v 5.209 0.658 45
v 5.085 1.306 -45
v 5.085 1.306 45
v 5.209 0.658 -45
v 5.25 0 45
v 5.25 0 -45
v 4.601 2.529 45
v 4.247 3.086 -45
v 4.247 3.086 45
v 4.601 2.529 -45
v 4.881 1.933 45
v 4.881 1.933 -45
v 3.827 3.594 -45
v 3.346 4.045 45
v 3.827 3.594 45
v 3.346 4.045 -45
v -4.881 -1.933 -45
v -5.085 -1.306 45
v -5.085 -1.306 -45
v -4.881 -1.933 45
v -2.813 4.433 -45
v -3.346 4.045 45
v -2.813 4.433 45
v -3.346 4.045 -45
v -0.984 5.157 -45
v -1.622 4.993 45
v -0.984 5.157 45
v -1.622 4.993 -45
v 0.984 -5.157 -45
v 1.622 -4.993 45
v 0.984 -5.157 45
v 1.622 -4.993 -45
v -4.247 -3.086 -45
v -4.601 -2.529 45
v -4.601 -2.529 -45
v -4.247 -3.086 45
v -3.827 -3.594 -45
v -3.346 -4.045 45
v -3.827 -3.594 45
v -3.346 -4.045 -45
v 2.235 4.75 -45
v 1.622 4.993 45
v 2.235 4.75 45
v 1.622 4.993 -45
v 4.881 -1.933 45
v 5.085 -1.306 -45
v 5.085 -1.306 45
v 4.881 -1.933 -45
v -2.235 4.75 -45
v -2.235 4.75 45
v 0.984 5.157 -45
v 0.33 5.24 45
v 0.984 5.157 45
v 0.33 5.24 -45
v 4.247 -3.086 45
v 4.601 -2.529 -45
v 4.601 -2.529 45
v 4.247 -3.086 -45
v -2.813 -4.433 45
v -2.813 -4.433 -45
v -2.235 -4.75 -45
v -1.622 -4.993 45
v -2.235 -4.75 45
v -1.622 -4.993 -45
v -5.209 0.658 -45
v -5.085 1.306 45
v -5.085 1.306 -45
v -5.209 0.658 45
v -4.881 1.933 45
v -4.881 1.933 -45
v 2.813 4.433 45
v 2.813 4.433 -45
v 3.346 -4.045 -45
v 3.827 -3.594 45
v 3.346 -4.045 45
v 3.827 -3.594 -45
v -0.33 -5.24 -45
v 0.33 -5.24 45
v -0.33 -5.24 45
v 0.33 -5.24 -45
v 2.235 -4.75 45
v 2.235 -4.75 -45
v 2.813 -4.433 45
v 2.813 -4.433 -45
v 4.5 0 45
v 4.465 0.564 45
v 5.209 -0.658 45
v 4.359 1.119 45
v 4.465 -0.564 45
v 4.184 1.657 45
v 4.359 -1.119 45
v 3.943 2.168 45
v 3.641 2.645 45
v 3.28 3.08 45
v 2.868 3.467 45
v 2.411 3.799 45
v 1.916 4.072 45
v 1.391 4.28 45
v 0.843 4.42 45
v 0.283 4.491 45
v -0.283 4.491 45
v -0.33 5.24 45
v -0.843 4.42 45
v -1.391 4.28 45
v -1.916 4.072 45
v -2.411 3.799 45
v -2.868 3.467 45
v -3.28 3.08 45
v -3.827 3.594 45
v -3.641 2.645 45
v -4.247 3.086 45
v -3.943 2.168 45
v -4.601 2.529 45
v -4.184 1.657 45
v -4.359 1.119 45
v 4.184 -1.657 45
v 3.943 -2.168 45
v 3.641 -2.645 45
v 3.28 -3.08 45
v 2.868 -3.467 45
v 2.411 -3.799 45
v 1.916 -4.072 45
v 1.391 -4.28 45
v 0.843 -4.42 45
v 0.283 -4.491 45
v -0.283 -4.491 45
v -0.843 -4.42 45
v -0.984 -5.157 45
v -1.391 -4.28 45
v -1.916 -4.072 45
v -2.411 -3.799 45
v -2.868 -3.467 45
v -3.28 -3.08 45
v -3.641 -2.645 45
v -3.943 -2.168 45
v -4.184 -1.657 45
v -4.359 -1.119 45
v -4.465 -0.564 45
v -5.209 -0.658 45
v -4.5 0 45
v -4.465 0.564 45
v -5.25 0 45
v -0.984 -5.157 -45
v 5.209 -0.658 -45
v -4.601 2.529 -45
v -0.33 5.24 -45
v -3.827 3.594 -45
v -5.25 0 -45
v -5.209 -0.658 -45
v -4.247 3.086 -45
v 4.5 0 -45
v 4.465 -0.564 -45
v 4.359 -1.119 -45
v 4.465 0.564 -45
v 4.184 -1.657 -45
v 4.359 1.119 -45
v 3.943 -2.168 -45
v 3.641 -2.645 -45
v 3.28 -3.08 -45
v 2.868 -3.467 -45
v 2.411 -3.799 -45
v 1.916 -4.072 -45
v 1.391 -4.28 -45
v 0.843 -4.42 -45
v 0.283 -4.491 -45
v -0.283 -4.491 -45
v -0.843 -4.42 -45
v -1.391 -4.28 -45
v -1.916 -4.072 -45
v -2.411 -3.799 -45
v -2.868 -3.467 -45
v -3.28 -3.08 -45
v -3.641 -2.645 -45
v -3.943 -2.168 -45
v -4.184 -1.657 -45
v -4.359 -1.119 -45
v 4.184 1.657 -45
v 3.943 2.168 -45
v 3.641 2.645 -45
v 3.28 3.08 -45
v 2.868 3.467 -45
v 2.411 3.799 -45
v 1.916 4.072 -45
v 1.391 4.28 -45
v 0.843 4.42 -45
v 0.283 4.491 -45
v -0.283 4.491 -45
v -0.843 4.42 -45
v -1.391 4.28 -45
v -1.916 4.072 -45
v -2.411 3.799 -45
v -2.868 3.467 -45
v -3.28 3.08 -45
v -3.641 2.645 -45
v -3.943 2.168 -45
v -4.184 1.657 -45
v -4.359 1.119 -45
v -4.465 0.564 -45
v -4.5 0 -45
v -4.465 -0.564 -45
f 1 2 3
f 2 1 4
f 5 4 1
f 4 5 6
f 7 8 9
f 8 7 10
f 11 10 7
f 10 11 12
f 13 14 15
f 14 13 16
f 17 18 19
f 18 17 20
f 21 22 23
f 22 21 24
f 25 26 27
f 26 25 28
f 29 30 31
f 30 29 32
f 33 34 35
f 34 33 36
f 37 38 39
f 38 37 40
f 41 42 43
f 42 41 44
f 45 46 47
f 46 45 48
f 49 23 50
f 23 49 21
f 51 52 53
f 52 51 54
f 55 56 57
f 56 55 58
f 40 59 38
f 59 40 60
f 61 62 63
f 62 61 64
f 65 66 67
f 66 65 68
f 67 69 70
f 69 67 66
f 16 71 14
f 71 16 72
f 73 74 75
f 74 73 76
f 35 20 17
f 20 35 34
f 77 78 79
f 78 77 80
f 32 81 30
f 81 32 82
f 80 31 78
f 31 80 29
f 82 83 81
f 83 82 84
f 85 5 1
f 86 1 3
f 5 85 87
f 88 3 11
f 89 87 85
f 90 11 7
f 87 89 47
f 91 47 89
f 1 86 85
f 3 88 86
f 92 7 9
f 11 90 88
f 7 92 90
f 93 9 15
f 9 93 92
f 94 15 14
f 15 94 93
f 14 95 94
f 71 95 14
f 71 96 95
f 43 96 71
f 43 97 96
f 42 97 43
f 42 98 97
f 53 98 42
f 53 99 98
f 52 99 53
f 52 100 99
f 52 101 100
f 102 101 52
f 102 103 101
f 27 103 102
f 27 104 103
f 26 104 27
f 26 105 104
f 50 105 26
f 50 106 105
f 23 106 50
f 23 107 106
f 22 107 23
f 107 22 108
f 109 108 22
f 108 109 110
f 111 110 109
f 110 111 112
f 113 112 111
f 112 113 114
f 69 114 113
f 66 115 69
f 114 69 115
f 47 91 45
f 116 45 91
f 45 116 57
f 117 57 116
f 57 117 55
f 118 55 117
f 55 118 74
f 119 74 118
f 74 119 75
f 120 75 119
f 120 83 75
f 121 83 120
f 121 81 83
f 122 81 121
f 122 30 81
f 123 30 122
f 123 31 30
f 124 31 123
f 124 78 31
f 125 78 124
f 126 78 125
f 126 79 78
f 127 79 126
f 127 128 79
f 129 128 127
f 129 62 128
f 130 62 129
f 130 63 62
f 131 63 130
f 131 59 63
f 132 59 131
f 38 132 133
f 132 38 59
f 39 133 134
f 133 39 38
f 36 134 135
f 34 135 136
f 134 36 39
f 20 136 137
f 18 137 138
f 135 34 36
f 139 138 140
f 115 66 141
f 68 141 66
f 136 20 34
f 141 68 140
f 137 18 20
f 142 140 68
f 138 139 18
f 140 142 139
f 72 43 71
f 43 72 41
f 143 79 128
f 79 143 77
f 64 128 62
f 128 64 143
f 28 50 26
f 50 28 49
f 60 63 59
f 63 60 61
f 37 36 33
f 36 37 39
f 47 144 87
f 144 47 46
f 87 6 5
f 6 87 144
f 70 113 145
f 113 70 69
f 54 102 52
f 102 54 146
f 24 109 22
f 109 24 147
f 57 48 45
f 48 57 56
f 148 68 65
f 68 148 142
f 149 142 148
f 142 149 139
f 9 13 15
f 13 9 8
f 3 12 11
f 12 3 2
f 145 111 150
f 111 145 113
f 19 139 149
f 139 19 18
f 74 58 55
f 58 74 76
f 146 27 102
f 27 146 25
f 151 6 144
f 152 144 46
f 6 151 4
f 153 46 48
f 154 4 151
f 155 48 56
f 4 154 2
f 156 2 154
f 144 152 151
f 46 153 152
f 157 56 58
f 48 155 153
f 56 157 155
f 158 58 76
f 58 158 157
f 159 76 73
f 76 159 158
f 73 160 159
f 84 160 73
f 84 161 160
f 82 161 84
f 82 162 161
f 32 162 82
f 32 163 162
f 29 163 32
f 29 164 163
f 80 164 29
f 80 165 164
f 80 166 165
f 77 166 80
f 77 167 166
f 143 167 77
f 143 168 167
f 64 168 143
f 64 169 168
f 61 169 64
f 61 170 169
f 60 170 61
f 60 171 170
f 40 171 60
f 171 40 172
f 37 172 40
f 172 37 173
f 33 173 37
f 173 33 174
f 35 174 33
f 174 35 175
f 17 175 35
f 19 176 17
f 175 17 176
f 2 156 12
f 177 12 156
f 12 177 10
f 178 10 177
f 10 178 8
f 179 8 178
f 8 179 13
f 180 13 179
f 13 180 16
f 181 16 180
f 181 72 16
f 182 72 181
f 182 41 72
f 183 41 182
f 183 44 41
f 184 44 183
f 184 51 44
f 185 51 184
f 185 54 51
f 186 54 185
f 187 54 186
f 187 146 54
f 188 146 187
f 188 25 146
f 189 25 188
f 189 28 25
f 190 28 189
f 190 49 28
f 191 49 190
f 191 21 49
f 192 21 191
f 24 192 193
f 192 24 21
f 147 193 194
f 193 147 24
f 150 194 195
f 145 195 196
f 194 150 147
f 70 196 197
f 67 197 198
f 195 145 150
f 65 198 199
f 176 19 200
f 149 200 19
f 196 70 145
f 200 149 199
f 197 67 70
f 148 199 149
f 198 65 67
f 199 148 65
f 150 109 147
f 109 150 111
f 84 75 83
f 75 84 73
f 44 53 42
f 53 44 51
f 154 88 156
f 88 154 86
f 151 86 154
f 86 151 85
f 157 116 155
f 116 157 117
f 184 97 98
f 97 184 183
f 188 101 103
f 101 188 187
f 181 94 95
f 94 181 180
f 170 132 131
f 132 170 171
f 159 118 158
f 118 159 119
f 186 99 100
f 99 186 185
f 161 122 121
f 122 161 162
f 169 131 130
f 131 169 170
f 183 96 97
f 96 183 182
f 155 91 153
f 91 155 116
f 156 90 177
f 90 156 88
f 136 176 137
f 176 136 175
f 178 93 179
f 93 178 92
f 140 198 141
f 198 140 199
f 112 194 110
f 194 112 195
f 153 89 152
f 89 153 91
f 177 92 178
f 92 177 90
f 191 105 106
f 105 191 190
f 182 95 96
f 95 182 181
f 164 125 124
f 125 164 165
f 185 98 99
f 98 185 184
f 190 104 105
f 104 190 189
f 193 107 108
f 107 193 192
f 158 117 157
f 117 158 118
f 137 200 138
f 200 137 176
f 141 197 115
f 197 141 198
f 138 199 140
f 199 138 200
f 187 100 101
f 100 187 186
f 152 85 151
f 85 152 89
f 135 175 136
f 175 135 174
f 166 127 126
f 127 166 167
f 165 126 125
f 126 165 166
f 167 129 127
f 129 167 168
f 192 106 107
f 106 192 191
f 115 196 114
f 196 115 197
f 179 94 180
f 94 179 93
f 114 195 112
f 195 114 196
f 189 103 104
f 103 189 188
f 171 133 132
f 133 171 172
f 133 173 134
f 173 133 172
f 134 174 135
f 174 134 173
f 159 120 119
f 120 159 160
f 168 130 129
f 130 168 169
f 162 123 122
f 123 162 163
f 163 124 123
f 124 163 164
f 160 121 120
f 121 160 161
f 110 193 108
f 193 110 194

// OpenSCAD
$fn = 50;


difference() {
	union() {
		translate(v = [0, 0, -45.0000000000]) {
			cylinder(h = 90, r = 5.2500000000);
		}
	}
	union() {
		translate(v = [0, 0, -100.0000000000]) {
			cylinder(h = 200, r = 4.5000000000);
		}
	}
}
